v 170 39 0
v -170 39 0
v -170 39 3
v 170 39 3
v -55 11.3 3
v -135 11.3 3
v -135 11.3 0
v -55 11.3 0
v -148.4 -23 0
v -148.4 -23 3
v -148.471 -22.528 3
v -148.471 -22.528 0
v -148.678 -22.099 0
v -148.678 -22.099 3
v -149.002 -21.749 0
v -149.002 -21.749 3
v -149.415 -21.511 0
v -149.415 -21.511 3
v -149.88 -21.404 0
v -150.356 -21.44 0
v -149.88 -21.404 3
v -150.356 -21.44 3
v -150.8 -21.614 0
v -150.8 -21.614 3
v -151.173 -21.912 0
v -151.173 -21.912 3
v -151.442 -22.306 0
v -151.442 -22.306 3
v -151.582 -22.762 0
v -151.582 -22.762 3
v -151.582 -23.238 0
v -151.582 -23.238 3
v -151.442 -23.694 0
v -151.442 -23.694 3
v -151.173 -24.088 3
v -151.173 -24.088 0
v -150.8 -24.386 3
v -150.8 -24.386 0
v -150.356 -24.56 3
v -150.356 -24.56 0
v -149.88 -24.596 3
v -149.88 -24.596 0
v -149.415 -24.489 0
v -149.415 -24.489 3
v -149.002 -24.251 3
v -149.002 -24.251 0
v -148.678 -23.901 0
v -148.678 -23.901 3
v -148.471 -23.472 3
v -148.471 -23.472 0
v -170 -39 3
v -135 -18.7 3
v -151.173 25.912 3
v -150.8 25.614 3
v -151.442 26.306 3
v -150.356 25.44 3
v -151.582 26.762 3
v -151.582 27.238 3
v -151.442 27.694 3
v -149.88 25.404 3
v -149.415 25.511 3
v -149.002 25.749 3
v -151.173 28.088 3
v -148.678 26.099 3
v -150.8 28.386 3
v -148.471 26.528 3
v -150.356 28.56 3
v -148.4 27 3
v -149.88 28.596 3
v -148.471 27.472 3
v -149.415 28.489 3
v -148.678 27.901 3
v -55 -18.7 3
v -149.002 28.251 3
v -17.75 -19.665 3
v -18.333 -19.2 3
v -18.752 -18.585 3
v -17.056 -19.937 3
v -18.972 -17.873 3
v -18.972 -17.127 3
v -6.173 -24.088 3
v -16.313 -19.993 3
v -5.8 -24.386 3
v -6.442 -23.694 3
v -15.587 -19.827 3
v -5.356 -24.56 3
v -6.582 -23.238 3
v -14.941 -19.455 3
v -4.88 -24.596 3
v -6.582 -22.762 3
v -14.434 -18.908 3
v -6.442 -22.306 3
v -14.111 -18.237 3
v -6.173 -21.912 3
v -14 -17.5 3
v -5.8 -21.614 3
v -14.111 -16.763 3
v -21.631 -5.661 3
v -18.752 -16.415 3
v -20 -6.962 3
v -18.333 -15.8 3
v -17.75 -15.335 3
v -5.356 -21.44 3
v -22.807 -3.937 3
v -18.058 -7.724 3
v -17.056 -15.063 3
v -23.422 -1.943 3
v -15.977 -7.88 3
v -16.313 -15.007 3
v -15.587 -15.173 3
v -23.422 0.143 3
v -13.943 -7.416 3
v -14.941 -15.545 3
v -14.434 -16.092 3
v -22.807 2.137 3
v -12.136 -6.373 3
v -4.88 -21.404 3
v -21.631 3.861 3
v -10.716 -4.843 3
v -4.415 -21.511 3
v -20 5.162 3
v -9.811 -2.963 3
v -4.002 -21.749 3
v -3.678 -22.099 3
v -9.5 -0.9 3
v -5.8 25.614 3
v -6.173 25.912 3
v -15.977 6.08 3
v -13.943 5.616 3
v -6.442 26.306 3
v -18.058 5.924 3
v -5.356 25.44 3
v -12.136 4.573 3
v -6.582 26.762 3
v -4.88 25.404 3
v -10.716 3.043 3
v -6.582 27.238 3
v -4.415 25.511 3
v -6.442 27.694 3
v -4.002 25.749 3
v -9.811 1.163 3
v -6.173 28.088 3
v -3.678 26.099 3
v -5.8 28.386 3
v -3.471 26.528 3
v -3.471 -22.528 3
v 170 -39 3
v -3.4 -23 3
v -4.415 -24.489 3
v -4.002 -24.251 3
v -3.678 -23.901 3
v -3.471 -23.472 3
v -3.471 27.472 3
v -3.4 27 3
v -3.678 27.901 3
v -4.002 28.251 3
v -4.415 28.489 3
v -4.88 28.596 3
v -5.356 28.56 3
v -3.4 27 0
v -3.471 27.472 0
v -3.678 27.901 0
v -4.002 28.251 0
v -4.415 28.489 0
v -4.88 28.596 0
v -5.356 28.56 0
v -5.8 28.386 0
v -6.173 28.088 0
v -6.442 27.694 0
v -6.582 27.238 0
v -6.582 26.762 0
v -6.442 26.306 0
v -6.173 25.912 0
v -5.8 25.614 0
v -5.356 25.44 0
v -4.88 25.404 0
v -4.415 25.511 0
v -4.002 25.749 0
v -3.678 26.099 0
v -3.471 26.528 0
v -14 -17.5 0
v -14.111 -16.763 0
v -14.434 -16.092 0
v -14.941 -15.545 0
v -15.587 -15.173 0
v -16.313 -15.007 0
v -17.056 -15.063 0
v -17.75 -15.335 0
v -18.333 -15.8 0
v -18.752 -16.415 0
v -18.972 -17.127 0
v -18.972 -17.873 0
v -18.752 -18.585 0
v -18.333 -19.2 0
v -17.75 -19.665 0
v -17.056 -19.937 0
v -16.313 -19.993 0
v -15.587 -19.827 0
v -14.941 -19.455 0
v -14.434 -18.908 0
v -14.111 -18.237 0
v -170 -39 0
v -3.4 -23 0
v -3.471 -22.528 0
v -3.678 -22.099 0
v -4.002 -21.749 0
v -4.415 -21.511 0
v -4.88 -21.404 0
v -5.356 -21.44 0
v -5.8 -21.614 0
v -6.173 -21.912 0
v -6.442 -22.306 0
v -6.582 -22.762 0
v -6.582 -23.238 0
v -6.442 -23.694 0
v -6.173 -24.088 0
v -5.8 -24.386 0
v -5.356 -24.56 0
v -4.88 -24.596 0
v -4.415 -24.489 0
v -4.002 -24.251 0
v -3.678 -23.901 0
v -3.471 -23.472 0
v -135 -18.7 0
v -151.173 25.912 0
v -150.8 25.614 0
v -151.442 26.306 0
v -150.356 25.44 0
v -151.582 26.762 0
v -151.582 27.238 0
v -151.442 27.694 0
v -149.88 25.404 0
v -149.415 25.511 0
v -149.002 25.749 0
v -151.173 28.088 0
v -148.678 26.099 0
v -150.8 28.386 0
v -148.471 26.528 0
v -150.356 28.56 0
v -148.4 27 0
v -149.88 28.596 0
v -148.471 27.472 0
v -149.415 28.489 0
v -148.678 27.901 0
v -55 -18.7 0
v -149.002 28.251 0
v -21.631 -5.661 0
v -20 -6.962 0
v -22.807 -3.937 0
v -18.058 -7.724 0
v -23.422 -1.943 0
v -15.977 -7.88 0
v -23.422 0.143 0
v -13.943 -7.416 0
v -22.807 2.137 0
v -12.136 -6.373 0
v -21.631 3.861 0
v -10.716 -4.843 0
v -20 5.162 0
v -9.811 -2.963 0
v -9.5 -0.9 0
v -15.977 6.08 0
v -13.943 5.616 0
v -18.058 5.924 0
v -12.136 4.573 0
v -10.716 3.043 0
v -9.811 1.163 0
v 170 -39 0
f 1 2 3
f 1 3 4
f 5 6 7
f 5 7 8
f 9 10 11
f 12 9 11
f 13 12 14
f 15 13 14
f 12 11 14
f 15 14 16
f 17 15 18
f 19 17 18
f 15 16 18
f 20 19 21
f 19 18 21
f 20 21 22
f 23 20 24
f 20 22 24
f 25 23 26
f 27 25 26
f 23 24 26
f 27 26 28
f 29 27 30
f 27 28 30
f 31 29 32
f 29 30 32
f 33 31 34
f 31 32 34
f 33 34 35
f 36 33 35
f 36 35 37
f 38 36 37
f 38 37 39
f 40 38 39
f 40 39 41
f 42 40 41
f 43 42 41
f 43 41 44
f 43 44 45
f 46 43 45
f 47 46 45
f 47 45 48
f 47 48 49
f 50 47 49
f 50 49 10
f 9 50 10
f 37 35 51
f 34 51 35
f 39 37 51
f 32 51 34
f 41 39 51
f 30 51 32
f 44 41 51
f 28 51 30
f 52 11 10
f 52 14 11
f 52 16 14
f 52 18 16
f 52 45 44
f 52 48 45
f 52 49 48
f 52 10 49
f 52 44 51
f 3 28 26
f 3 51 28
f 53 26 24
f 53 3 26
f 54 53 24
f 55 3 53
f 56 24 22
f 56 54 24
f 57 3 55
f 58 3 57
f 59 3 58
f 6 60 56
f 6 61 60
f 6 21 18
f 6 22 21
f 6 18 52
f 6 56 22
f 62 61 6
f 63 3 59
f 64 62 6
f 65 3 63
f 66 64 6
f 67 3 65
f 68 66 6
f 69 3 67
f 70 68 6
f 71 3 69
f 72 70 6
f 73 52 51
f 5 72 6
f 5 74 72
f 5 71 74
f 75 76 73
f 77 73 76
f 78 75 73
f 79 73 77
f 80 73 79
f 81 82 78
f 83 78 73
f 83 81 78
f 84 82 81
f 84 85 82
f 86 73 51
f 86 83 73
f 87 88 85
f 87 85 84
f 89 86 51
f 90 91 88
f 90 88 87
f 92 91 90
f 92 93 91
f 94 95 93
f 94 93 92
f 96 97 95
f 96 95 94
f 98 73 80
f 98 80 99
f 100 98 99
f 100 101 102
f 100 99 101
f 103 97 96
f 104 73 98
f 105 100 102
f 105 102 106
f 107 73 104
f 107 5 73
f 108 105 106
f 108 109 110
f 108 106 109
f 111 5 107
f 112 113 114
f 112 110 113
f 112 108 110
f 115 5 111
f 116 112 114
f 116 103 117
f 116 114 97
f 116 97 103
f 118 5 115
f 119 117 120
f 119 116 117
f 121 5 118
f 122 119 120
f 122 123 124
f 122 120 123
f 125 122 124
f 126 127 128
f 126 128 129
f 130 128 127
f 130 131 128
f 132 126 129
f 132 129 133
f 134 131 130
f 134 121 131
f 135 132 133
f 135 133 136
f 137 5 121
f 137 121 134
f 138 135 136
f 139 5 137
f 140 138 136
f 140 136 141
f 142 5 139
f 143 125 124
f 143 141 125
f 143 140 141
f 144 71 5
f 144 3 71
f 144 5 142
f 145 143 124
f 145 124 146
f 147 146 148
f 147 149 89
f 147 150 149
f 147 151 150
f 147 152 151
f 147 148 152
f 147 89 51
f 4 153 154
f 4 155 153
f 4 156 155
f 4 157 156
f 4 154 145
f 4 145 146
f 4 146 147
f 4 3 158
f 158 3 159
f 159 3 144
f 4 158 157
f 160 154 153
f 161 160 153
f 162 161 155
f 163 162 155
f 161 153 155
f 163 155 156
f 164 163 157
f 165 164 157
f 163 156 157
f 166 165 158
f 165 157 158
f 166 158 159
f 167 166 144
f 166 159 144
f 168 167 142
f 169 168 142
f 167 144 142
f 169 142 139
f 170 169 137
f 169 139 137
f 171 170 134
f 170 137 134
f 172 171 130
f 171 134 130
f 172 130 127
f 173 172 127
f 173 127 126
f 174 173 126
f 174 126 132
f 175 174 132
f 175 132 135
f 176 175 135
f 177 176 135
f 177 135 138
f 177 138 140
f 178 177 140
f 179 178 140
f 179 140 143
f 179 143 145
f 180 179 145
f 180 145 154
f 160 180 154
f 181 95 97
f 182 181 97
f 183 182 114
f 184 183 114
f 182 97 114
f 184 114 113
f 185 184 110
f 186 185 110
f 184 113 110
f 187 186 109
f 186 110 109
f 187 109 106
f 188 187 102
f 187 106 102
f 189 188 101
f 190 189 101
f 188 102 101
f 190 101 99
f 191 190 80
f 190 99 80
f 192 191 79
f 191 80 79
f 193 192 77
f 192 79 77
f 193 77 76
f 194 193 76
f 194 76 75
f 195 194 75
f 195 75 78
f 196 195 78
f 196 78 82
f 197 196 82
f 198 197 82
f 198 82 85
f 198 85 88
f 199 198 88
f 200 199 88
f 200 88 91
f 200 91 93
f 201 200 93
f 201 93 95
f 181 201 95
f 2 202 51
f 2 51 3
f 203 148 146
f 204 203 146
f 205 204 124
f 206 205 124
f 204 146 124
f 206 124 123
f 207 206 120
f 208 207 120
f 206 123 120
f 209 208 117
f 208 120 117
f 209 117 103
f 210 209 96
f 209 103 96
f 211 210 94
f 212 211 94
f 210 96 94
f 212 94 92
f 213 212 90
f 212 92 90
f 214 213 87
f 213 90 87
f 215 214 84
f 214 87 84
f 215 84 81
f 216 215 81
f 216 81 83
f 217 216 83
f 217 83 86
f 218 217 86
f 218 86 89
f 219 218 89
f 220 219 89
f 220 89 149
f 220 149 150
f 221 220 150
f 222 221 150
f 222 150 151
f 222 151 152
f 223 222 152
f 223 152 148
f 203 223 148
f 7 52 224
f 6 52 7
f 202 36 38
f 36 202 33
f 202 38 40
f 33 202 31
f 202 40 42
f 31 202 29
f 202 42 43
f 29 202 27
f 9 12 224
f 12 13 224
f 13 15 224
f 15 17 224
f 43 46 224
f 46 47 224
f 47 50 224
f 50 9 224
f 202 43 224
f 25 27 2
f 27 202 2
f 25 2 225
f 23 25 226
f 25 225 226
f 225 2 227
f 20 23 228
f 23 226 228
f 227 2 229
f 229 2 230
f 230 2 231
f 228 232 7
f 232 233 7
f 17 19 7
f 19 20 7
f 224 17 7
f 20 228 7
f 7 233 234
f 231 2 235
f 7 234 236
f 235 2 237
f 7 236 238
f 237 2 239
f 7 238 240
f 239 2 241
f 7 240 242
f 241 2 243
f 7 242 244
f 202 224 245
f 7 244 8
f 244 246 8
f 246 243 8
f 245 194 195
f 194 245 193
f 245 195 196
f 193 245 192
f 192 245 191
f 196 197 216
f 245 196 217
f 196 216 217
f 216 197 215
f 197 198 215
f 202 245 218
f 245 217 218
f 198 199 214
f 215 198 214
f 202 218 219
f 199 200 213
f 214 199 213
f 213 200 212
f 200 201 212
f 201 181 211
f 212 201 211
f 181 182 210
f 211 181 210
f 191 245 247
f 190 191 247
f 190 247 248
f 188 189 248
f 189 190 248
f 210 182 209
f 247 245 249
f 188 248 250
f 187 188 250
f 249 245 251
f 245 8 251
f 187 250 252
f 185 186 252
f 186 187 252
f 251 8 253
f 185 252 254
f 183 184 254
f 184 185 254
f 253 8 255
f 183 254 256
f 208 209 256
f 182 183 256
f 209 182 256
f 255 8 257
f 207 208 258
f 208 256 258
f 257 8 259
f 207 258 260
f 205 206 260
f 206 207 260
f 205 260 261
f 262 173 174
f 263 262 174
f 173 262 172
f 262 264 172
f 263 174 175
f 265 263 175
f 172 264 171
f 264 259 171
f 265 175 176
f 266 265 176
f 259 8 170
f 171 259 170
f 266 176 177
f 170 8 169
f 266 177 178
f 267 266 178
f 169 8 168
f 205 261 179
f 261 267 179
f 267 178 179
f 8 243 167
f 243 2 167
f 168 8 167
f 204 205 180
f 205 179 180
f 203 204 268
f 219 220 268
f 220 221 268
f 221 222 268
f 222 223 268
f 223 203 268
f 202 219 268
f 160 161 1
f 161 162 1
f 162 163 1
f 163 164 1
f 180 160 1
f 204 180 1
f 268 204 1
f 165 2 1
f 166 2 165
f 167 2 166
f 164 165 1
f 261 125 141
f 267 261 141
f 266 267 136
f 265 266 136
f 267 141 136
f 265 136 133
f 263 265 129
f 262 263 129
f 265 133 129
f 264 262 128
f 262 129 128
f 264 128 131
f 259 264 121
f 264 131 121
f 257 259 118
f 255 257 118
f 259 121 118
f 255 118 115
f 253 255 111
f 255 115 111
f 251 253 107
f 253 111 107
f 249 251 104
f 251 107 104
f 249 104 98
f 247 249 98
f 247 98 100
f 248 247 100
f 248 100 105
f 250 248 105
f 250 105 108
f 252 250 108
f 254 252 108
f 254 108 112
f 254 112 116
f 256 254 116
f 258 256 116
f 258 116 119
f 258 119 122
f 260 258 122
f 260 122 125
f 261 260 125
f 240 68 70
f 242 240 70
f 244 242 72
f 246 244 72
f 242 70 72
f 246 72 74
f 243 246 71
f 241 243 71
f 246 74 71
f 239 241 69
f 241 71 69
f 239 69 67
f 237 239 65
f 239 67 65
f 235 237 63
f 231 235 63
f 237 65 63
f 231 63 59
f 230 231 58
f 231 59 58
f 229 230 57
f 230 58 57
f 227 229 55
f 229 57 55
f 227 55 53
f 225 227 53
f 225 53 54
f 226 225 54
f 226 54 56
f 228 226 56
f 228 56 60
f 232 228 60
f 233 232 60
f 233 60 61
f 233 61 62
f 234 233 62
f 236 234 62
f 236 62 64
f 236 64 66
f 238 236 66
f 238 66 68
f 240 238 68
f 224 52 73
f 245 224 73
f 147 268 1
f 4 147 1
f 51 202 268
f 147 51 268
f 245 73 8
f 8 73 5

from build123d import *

# Parameters (mm, degrees)
ESQUISSE1_W             = 340
ESQUISSE1_H             = 78
BOSS_EXTRU_1_DEPTH      = 3
ESQUISSE2_R             = 1.6
ENL_V_MAT_EXTRU_1_DEPTH = 4
ESQUISSE3_W             = 80
ESQUISSE3_H             = 30
ENL_V_MAT_EXTRU_2_DEPTH = 4
ESQUISSE4_R             = 7
ESQUISSE4_R_2           = 2.5
ENL_V_MAT_EXTRU_3_DEPTH = 4


with BuildPart() as part:
    # Esquisse1 → Boss.-Extru.1 (new body)
    with BuildSketch(Plane.XY):
        Rectangle(ESQUISSE1_W, ESQUISSE1_H)
    extrude(amount=BOSS_EXTRU_1_DEPTH)

    # Esquisse2 → Enlèv. mat.-Extru.1 (cut, through all)
    with BuildSketch(Plane.XY.offset(3)):
        with Locations((-150, 27)):
            Circle(ESQUISSE2_R)
        with Locations((-150, -23)):
            Circle(ESQUISSE2_R)
        with Locations((-5, 27)):
            Circle(ESQUISSE2_R)
        with Locations((-5, -23)):
            Circle(ESQUISSE2_R)
    extrude(amount=-ENL_V_MAT_EXTRU_1_DEPTH, mode=Mode.SUBTRACT)

    # Esquisse3 → Enlèv. mat.-Extru.2 (cut, through all)
    with BuildSketch(Plane.XY.offset(3)):
        with Locations((-95, -3.7)):
            Rectangle(ESQUISSE3_W, ESQUISSE3_H)
    extrude(amount=-ENL_V_MAT_EXTRU_2_DEPTH, mode=Mode.SUBTRACT)

    # Esquisse4 → Enlèv. mat.-Extru.3 (cut, through all)
    with BuildSketch(Plane.XY.offset(3)):
        with Locations((-16.5, -0.9)):
            Circle(ESQUISSE4_R)
        with Locations((-16.5, -17.5)):
            Circle(ESQUISSE4_R_2)
    extrude(amount=-ENL_V_MAT_EXTRU_3_DEPTH, mode=Mode.SUBTRACT)


solid = part.part
